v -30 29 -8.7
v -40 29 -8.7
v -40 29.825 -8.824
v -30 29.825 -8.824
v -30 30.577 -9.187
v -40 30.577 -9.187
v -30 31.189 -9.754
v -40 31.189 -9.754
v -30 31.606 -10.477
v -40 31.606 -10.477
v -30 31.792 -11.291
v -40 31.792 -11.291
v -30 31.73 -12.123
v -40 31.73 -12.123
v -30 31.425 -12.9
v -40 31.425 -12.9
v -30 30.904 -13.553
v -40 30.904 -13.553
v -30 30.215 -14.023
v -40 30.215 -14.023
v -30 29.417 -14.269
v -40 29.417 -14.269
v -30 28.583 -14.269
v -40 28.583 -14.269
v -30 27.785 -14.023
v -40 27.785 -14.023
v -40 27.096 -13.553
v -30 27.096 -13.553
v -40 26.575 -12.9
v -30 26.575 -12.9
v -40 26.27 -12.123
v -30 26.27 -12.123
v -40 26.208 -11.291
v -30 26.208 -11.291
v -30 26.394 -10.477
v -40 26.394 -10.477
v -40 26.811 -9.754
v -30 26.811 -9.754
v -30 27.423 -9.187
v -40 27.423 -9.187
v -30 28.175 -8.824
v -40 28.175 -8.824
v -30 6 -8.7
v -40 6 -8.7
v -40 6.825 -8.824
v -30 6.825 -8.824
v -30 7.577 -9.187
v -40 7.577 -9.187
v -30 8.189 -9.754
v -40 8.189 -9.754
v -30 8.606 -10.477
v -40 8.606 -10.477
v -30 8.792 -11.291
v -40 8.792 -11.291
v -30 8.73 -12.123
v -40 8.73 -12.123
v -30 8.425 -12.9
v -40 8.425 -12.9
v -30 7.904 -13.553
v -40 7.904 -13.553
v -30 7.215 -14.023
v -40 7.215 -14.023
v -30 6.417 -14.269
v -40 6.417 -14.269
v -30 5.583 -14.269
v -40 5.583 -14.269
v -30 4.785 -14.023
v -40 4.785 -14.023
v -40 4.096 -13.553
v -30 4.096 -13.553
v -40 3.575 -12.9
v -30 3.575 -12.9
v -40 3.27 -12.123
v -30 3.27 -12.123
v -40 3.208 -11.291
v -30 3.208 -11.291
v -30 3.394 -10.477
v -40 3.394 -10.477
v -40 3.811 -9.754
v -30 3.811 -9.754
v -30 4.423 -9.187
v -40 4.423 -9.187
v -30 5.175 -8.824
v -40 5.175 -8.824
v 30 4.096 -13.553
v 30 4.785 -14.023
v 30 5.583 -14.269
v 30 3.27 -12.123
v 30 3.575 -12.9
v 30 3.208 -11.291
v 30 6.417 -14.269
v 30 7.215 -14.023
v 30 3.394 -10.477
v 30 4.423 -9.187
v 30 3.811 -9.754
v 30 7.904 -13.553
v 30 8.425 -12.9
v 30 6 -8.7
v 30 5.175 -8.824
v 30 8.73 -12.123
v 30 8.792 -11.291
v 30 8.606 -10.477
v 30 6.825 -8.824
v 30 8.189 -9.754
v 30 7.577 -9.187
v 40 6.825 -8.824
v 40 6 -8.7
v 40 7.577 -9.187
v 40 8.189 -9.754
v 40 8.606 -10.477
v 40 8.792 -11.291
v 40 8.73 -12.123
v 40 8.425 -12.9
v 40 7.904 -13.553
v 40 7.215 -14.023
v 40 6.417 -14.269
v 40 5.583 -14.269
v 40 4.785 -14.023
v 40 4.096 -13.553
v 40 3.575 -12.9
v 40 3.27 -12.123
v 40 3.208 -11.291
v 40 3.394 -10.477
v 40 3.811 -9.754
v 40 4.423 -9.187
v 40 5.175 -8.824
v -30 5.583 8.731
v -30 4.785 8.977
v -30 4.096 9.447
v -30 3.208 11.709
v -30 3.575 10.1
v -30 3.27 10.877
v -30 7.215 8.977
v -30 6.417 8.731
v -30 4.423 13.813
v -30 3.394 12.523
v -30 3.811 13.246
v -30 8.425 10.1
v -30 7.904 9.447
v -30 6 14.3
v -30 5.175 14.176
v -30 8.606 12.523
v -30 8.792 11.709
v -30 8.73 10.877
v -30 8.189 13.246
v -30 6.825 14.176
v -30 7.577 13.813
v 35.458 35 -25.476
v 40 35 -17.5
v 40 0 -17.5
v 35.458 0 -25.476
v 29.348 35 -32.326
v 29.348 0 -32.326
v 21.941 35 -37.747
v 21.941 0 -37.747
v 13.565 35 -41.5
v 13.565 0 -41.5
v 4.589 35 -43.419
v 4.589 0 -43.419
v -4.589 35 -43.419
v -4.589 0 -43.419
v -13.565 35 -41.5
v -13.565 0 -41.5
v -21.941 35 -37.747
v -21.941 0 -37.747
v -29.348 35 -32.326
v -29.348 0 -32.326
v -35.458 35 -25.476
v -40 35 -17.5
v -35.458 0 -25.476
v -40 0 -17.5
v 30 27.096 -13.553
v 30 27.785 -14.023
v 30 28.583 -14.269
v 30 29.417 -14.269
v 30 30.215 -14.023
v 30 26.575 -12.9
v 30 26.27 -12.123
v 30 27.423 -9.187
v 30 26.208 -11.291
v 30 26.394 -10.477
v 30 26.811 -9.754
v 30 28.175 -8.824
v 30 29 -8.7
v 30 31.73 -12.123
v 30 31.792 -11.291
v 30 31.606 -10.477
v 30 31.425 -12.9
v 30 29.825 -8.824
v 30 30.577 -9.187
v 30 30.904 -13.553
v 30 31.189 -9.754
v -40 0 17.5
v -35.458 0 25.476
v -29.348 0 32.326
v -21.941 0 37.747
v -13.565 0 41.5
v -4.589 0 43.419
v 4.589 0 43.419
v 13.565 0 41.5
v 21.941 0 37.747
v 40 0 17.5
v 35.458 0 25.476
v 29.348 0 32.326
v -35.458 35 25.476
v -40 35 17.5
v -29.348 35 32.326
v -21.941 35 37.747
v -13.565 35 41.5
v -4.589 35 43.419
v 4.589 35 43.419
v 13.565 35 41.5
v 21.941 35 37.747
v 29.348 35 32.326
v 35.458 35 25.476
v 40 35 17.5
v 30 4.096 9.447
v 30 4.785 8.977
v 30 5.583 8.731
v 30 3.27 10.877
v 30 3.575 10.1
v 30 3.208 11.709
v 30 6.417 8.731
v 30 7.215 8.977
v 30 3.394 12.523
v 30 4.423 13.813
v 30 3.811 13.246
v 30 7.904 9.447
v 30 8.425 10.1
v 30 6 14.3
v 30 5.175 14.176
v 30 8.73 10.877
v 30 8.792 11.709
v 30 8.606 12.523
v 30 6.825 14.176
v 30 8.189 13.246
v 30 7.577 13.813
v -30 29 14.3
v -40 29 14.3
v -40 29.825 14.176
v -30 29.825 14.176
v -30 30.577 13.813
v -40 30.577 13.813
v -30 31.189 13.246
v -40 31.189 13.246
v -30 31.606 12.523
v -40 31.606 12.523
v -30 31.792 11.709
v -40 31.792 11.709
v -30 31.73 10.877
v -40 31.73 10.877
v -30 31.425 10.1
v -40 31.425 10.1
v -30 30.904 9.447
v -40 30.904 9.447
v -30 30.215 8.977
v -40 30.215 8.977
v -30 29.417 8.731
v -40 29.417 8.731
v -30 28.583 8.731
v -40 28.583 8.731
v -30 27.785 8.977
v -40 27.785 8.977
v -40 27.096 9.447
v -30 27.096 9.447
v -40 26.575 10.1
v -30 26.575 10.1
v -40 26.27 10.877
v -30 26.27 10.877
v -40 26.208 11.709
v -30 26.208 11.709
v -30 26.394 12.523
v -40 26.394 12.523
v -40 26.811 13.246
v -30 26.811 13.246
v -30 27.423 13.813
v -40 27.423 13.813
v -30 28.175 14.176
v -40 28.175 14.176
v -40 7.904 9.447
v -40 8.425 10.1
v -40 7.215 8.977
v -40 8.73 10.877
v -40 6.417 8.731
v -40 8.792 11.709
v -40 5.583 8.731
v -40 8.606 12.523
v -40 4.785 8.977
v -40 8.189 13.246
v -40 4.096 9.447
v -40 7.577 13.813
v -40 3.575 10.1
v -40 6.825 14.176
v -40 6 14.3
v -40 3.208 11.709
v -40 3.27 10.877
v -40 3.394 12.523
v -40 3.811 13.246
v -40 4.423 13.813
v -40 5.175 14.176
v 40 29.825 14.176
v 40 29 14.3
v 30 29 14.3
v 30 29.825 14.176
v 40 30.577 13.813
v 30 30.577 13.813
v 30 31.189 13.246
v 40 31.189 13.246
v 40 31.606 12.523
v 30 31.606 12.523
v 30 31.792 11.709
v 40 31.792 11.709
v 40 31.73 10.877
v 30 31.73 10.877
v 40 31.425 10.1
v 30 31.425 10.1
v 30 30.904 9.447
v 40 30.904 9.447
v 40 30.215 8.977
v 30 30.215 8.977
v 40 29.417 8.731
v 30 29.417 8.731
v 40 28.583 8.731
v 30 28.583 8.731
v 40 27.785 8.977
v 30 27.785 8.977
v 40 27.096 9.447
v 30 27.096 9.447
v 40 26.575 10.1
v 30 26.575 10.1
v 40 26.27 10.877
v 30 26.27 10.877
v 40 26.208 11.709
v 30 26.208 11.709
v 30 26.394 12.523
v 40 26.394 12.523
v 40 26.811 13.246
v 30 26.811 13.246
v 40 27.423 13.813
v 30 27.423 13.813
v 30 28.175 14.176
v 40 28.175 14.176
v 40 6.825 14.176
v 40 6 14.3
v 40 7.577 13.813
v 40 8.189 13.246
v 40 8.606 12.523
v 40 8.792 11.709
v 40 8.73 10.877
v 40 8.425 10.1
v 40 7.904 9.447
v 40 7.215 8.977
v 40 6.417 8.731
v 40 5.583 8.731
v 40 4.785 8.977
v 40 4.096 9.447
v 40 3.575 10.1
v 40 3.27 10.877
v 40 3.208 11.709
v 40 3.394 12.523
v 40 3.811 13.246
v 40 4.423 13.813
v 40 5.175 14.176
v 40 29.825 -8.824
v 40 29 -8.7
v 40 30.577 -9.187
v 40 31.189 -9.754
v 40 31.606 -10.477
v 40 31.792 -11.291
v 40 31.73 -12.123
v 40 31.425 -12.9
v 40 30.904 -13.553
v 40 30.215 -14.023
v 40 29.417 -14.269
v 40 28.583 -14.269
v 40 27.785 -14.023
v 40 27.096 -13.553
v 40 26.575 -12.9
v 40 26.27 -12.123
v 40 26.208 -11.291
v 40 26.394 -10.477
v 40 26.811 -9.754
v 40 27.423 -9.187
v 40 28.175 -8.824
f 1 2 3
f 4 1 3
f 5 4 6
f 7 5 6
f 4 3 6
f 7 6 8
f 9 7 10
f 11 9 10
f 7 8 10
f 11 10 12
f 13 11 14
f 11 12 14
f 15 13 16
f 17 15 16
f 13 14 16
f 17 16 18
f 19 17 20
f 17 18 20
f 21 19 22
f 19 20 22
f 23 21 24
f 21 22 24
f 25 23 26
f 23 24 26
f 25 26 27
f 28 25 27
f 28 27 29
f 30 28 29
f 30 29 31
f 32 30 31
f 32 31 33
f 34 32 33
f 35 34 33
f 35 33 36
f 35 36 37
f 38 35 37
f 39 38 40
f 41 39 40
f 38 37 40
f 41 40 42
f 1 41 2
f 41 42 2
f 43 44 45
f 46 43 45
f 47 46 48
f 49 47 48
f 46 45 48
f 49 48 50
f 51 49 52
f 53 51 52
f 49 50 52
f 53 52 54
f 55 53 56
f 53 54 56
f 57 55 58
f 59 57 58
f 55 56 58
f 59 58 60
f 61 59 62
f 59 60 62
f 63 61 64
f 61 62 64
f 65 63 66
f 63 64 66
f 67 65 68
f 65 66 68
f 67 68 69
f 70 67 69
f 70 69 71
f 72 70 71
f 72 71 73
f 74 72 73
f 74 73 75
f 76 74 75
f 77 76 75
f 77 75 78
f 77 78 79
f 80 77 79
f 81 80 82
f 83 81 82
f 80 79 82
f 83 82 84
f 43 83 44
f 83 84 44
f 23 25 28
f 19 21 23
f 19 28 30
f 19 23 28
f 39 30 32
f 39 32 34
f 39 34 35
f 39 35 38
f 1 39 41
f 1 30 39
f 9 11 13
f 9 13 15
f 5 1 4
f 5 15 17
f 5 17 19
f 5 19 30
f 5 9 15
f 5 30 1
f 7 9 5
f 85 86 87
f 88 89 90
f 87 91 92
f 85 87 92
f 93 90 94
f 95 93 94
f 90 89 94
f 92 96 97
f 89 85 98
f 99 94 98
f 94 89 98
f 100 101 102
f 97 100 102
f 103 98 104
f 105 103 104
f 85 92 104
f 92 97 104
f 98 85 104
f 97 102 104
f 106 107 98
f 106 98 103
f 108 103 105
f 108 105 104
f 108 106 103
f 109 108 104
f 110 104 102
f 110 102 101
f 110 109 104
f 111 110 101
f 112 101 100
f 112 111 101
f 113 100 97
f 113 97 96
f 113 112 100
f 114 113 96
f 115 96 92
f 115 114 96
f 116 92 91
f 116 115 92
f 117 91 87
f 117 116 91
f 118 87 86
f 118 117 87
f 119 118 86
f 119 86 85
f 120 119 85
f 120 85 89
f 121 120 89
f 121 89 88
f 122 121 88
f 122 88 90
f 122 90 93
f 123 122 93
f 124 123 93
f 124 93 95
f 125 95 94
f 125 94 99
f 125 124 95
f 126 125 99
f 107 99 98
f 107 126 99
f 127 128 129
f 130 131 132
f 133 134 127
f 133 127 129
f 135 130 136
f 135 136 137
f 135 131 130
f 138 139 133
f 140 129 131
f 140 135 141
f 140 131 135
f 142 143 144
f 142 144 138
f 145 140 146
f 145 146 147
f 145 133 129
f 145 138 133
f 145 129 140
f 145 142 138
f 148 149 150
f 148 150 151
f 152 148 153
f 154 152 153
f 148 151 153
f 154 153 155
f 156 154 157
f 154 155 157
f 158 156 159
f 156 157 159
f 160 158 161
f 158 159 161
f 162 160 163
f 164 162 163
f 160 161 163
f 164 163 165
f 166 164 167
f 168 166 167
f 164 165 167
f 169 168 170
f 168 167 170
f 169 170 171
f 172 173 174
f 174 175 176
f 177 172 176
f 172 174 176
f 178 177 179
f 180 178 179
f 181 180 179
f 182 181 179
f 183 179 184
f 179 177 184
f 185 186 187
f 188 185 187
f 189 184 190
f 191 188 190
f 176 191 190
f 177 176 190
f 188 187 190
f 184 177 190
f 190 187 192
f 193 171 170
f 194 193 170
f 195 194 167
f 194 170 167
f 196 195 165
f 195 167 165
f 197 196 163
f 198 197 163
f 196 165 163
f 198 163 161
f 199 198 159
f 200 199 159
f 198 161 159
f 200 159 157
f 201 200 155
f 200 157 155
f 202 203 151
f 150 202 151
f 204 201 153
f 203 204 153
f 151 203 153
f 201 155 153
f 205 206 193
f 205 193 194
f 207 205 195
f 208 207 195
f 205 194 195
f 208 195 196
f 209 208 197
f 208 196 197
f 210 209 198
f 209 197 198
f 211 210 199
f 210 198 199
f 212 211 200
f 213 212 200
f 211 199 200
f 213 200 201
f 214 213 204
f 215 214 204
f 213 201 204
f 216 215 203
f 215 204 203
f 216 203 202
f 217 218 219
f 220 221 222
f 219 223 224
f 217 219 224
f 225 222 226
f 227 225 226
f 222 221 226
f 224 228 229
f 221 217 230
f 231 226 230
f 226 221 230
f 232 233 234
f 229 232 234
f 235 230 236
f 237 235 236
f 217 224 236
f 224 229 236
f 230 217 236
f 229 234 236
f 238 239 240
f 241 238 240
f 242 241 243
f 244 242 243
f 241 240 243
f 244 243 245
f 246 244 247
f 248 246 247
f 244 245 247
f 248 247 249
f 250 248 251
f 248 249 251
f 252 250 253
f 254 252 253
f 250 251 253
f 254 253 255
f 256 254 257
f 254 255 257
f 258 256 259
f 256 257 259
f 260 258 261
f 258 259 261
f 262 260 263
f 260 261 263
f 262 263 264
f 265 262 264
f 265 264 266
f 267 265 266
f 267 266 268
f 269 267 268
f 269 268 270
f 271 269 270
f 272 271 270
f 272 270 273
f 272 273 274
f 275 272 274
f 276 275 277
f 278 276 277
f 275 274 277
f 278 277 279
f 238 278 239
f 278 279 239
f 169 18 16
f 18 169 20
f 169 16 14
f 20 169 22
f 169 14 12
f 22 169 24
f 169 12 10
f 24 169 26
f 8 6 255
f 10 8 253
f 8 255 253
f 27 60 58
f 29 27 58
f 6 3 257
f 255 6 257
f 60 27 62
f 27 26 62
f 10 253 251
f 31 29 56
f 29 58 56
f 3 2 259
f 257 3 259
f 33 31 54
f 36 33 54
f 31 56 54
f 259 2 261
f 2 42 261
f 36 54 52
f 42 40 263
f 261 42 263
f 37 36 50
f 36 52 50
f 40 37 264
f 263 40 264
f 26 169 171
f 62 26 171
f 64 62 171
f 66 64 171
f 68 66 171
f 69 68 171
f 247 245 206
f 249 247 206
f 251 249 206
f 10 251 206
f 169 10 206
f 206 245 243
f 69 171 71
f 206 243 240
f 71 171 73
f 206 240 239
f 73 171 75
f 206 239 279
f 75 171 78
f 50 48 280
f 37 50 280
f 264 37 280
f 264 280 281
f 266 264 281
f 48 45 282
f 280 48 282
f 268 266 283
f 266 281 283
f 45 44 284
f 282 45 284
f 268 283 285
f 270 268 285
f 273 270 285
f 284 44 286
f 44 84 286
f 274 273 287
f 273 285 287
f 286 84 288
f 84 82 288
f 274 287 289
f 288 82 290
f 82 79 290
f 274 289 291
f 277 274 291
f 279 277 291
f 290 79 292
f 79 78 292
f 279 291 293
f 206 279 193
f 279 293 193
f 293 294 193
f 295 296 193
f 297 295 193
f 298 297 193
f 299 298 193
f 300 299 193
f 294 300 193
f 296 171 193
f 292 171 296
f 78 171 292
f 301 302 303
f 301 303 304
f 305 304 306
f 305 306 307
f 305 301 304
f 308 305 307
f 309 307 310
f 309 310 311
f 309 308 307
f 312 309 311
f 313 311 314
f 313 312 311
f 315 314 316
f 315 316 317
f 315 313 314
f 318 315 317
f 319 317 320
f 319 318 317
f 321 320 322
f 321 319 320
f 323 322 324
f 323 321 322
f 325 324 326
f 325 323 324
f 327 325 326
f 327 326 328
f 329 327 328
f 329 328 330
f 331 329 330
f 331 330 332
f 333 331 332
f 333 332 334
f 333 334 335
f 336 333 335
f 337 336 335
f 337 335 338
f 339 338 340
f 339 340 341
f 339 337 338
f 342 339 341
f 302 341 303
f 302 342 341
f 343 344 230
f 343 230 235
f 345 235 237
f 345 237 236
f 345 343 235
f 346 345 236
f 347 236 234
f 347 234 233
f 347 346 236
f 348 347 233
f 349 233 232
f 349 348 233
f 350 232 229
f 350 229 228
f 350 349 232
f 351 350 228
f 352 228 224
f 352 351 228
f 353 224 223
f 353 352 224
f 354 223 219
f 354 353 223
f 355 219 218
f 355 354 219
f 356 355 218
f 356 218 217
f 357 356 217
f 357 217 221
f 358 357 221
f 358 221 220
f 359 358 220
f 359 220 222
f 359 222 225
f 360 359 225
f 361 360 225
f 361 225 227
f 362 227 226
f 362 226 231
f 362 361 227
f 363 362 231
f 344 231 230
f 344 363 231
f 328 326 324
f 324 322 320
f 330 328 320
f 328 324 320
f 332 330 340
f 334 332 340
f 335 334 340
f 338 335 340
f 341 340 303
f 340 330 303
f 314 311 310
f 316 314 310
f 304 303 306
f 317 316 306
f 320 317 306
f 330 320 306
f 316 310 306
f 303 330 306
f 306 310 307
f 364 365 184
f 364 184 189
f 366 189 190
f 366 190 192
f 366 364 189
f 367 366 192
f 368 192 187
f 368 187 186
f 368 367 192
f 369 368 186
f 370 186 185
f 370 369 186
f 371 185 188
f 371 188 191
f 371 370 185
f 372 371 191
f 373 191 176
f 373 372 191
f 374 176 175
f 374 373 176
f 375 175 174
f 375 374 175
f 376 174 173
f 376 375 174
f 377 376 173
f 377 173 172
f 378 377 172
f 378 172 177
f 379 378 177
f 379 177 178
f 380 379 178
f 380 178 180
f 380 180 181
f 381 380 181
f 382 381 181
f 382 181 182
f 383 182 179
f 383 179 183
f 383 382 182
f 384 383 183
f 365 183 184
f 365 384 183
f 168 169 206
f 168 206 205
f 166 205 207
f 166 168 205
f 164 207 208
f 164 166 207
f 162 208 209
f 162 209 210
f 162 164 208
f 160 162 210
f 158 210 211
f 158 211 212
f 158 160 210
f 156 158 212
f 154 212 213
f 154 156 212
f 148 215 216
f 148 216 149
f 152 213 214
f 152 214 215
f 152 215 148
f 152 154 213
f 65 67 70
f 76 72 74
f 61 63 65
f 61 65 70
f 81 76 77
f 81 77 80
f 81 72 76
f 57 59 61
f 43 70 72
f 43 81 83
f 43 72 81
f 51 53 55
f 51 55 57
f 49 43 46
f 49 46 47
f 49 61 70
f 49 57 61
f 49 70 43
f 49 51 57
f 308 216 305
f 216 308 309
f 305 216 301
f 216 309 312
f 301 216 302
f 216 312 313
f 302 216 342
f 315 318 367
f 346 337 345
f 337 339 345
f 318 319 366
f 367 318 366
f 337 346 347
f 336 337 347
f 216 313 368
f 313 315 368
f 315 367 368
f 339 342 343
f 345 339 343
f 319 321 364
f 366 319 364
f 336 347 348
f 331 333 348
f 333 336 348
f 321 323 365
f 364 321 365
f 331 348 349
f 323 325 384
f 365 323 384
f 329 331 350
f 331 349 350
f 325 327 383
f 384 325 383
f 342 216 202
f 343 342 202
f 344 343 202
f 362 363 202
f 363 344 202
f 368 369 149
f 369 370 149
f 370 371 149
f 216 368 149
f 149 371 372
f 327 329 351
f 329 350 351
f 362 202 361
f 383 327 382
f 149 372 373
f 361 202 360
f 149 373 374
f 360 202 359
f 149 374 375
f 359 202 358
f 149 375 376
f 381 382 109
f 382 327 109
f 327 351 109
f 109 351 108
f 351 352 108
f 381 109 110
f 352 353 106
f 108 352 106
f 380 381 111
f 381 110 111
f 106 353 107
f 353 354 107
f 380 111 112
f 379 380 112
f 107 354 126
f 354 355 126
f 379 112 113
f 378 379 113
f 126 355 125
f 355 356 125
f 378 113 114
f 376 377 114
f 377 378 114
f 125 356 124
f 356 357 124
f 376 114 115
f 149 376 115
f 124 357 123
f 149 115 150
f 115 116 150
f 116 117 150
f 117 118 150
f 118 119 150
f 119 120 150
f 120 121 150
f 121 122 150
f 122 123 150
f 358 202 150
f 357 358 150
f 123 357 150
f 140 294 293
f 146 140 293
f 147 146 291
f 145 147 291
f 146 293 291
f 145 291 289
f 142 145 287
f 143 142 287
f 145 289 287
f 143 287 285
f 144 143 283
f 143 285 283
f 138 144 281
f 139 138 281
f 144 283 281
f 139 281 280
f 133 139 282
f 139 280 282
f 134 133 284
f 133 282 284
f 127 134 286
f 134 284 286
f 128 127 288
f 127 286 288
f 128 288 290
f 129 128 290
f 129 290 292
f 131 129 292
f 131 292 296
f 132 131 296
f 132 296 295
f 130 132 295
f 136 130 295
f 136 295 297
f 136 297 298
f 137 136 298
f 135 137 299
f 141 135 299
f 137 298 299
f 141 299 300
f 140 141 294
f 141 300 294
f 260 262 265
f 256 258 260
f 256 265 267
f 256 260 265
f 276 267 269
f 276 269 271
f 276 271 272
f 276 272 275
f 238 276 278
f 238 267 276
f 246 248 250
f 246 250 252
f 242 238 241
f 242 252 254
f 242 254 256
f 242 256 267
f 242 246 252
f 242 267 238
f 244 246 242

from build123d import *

# Parameters (mm, degrees)
BOSS_EXTRUDE1_DEPTH = 35
SKETCH2_R           = 2.8
CUT_EXTRUDE1_DEPTH  = 10
CUT_EXTRUDE2_START  = -80
SKETCH2_2_R         = 2.8
CUT_EXTRUDE2_DEPTH  = 10


with BuildPart() as part:
    # Sketch1 → Boss-Extrude1 (new body)
    with BuildSketch(Plane(origin=(0, 0, 0), x_dir=(1, 0, 0), z_dir=(0, 1, 0))):
        with BuildLine():
            Line((-40, 17.5), (-40, -17.5))
            ThreePointArc((-40, -17.5), (0, -43.660622991), (40, -17.5))
            Line((40, -17.5), (40, 17.5))
            ThreePointArc((40, 17.5), (0, 43.660622991), (-40, 17.5))
        make_face()
    extrude(amount=BOSS_EXTRUDE1_DEPTH)

    # Sketch2 → Cut-Extrude1 (cut)
    with BuildSketch(Plane.ZY.offset(40)):
        with Locations((-11.5, 29)):
            Circle(SKETCH2_R)
        with Locations((11.5, 29)):
            Circle(SKETCH2_R)
        with Locations((-11.5, 6)):
            Circle(SKETCH2_R)
        with Locations((11.5, 6)):
            Circle(SKETCH2_R)
    extrude(amount=-CUT_EXTRUDE1_DEPTH, mode=Mode.SUBTRACT)

    # Sketch2<2> → Cut-Extrude2 (cut)
    with BuildSketch(Plane.ZY.offset(40).offset(CUT_EXTRUDE2_START)):
        with Locations((-11.5, 29)):
            Circle(SKETCH2_2_R)
        with Locations((11.5, 29)):
            Circle(SKETCH2_2_R)
        with Locations((-11.5, 6)):
            Circle(SKETCH2_2_R)
        with Locations((11.5, 6)):
            Circle(SKETCH2_2_R)
    extrude(amount=CUT_EXTRUDE2_DEPTH, mode=Mode.SUBTRACT)


solid = part.part
